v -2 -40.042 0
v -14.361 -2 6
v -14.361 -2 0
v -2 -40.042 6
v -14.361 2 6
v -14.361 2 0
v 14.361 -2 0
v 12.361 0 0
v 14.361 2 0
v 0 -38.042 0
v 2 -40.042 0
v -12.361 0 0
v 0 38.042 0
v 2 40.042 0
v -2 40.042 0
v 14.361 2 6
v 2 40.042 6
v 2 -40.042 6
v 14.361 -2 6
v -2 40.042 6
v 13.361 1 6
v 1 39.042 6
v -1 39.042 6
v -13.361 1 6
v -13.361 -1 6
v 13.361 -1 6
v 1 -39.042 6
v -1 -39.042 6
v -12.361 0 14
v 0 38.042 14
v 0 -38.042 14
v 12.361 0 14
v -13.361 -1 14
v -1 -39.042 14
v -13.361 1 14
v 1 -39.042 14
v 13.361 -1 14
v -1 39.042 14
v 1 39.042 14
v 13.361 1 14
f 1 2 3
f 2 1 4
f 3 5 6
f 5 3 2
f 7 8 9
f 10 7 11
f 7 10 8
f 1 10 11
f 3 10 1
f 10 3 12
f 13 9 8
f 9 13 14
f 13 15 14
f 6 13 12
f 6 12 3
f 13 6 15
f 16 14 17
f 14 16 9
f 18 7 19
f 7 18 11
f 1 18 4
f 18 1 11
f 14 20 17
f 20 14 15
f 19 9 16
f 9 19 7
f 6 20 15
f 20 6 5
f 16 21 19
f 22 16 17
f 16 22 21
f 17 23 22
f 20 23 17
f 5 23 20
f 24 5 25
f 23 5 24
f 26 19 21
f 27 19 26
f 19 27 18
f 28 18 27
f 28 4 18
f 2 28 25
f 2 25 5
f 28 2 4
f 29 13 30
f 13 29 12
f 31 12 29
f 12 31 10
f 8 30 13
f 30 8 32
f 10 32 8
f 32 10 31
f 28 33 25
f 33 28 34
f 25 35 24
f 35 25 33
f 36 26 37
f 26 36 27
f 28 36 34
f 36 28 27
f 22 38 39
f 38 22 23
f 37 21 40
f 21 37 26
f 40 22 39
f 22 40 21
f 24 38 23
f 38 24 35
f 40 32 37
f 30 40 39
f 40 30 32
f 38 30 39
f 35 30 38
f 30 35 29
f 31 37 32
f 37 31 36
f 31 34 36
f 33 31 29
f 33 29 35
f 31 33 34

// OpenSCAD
//Choose which Rhombus you want
rhombus_angle=36; // [36,72]
//Height of the thicker part of the cutter.
handle_height=2;
//Height of the thinner part of the cutter.
cutter_height=10;
//thickness of the thicker part.
handle_thickness=2;
//thickness of the thinner part.
cutter_thickness=1;
//Length of each side in mm.
side_len=40;

module offset_shell(thickness = 0.5) {
  translate([0,0,thickness])
    difference() {
      render() {
        minkowski() {
          children();
          cube([2 * thickness, 2 * thickness, 2 * thickness], center=true);
        }
      }
      translate([0, 0, -5 * thickness]) scale([1, 1, 100])
        children();
    }
}
module rhombus(angle, r=1){
        coords = [[0,r*cos(angle/2)],
                  [r*sin(angle/2),0],
                  [0,-r*cos(angle/2)],
                  [-r*sin(angle/2),0]];
        polygon(coords);
 }

module make_cutter(angle=36,thickness=1,height=1,side_len=1) {
offset_shell(thickness)
  linear_extrude(height=height)
    rhombus(angle,side_len);
}

translate([0,0,0])
  make_cutter(rhombus_angle,handle_thickness,handle_height,side_len);
translate([0,0,handle_height])
  make_cutter(rhombus_angle,cutter_thickness,cutter_height,side_len);
